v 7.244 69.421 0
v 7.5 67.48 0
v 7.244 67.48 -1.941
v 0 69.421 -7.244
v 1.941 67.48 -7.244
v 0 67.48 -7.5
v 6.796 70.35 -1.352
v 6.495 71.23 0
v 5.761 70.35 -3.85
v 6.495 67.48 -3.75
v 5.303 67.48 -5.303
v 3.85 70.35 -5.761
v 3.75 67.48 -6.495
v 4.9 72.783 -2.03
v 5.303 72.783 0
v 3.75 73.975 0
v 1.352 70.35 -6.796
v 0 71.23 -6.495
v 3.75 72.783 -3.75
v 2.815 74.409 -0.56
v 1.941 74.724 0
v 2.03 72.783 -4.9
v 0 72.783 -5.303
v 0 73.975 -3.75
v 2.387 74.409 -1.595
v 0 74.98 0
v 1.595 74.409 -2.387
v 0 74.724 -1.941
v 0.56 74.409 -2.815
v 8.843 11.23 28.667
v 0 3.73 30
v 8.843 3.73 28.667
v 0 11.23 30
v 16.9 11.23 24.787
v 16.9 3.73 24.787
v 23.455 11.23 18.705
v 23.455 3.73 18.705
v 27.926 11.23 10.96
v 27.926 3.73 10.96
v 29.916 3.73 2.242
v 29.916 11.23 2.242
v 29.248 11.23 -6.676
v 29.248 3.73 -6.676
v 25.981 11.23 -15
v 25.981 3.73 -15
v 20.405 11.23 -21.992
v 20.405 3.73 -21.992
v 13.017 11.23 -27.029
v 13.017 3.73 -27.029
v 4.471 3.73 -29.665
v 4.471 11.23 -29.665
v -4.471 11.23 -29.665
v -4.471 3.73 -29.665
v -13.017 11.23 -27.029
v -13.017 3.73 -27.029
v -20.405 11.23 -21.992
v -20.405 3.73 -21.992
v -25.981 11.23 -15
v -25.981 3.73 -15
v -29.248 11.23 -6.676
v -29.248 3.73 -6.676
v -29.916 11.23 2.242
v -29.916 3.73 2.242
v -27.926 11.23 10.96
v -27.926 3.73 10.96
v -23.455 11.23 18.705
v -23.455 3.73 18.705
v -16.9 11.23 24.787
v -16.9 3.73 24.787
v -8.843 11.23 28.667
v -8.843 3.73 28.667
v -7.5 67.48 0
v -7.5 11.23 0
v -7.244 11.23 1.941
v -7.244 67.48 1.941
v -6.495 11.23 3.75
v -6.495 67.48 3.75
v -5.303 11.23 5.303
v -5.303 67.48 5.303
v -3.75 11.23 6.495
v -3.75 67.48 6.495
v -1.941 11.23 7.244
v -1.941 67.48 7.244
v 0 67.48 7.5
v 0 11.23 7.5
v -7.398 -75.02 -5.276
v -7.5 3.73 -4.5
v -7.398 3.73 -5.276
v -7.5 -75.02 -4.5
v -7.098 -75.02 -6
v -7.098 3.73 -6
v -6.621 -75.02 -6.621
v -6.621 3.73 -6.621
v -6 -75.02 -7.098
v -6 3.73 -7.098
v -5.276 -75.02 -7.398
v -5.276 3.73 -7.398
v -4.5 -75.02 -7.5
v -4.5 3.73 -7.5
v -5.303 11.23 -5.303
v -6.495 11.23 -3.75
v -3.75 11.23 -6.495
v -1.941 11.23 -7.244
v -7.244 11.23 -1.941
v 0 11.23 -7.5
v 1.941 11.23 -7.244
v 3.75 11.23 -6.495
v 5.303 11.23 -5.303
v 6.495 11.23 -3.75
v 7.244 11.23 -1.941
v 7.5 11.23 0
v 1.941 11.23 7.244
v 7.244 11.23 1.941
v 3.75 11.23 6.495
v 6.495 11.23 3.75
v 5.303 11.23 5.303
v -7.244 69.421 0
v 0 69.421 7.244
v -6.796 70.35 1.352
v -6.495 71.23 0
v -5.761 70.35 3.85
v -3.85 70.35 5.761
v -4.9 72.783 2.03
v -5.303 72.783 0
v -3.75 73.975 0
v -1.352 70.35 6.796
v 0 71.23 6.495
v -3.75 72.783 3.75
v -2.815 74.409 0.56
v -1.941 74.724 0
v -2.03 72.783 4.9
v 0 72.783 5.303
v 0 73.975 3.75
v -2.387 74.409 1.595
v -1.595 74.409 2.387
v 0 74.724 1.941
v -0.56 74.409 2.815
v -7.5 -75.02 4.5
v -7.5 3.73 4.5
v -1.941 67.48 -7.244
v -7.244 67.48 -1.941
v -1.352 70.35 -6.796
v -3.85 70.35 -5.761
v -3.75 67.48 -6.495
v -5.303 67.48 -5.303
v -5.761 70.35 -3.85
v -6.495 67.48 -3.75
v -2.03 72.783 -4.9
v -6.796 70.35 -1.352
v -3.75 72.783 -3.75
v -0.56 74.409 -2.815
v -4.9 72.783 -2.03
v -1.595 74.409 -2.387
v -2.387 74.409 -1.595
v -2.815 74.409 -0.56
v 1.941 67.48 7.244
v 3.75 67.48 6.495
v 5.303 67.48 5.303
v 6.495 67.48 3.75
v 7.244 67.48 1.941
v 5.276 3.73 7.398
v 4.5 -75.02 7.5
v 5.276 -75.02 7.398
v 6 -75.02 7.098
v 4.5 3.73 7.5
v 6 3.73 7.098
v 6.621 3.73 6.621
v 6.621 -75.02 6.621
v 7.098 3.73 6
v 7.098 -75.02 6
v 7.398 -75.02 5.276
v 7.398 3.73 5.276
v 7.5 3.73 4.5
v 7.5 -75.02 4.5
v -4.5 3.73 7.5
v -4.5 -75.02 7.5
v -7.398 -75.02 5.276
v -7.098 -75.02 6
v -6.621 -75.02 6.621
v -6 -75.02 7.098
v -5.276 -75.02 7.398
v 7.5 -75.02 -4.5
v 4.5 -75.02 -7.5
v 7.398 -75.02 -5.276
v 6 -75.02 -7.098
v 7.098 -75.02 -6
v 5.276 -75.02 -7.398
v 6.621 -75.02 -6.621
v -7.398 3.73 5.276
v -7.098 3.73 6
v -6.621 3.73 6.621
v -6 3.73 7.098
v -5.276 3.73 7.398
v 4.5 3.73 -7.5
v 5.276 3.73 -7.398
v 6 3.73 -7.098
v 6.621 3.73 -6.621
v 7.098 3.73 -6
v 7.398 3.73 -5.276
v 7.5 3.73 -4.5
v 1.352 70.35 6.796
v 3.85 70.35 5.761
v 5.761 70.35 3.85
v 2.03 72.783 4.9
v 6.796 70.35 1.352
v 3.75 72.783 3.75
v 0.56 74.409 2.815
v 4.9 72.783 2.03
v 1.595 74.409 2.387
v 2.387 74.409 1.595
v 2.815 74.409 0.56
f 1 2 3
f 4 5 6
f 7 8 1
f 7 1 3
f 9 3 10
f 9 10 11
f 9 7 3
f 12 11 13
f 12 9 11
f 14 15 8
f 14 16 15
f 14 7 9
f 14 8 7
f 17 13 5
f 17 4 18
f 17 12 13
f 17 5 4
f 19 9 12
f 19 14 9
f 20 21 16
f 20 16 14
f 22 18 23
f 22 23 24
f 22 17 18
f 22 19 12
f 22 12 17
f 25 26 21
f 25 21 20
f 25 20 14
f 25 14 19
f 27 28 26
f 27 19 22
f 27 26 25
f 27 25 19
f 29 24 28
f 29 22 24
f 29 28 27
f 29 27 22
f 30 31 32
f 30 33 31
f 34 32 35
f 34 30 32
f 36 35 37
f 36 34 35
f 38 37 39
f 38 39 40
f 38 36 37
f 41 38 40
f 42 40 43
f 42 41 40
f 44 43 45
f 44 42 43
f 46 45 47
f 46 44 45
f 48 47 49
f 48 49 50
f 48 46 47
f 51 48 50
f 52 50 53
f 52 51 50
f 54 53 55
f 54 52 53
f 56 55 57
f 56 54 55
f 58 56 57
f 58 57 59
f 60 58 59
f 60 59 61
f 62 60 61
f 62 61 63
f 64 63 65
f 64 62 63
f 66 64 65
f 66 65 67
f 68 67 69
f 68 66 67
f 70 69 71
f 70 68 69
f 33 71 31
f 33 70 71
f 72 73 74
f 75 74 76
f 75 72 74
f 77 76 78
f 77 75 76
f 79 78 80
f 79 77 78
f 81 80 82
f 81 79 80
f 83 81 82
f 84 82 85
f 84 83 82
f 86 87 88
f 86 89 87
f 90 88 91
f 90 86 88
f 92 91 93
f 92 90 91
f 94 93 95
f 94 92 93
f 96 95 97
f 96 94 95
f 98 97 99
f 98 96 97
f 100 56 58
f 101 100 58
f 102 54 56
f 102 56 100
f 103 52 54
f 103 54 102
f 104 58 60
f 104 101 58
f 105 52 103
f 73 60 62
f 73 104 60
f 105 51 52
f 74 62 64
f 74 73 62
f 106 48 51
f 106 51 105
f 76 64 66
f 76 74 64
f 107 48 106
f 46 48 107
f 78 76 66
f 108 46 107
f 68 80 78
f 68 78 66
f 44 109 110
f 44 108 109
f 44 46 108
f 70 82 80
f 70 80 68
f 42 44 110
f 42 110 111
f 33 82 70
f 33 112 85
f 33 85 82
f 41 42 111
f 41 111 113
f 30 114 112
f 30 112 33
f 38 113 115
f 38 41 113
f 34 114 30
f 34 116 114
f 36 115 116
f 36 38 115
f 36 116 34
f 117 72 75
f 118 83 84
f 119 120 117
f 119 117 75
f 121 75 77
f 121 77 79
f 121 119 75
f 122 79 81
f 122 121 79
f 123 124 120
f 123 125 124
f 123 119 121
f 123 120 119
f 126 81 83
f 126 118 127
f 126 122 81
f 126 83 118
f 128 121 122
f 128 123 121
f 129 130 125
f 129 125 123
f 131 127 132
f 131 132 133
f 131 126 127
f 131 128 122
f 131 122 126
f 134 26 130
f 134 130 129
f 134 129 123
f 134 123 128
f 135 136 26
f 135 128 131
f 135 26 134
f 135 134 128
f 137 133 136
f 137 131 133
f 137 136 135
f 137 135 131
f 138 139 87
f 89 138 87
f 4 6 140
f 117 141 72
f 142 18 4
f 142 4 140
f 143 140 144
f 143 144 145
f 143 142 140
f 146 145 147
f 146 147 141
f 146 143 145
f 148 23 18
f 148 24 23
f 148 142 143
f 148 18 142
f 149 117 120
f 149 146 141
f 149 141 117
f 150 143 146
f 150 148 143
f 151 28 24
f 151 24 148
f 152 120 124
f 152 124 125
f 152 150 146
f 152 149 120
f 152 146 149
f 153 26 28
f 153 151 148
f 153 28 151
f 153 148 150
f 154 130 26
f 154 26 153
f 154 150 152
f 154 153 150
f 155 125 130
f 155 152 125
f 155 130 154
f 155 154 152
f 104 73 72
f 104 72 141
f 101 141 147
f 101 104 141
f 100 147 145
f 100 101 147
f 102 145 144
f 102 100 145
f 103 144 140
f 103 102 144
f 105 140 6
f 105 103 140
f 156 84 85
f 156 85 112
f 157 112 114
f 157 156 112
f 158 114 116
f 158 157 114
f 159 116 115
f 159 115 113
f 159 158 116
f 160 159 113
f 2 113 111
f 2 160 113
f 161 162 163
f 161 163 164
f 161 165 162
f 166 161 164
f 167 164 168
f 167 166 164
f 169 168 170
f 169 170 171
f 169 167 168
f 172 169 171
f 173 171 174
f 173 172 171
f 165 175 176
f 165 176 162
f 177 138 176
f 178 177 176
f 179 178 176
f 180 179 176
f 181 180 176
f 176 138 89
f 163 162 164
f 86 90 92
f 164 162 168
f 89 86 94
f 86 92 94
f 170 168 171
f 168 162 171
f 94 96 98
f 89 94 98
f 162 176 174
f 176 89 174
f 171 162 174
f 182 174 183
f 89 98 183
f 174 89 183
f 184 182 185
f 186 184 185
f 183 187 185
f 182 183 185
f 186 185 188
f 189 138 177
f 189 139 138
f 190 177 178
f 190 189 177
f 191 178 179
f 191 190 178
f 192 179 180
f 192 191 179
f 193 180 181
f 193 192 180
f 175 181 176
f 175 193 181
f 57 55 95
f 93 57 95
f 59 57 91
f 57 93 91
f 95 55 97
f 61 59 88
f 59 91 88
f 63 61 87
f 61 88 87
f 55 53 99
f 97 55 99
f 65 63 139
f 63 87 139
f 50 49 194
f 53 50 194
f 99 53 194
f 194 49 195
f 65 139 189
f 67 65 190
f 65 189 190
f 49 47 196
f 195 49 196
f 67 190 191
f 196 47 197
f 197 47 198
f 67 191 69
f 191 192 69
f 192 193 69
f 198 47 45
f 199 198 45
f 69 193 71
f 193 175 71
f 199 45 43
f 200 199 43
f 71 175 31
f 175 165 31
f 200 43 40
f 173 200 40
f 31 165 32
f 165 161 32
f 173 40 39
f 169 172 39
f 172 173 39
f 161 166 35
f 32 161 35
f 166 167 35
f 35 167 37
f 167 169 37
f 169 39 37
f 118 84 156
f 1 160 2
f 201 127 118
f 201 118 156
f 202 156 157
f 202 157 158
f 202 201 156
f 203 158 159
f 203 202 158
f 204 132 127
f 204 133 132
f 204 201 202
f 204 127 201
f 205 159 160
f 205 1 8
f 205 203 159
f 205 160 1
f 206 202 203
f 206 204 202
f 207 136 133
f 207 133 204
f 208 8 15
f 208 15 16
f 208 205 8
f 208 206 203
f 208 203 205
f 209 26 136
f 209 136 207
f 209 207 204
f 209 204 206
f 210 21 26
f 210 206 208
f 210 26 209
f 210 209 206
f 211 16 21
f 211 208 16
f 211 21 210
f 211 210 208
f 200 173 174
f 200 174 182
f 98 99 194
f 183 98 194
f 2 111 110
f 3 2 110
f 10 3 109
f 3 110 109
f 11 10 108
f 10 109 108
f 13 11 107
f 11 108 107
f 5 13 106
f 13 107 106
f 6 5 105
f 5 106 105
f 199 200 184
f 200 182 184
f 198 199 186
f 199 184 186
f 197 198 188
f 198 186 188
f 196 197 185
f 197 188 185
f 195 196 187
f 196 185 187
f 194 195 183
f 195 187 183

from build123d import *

# Parameters (mm, degrees)
SKETCH1_W           = 10
SKETCH1_H           = 10
BOSS_EXTRUDE1_DEPTH = 50
BOSS_EXTRUDE2_START = -45
SKETCH2_R           = 20
BOSS_EXTRUDE2_DEPTH = 2.5
FILLET2_R           = 2
FILLET3_R           = 5
FILLET4_R           = 5
SCALE1_SCALE        = 1.5


with BuildPart() as part:
    # Sketch1 → Boss-Extrude1 (new, symmetric)
    with BuildSketch(Plane(origin=(0, 0, 0), x_dir=(1, 0, 0), z_dir=(0, 1, 0))):
        Rectangle(SKETCH1_W, SKETCH1_H)
    extrude(amount=BOSS_EXTRUDE1_DEPTH, both=True)

    # Sketch2 → Boss-Extrude2 (add, symmetric)
    with BuildSketch(Plane(origin=(0, 50, 0), x_dir=(1, 0, 0), z_dir=(0, 1, 0)).offset(BOSS_EXTRUDE2_START)):
        with Locations(Location((0, 0, 0), (0, 0, 270))):
            Circle(SKETCH2_R)
    extrude(amount=BOSS_EXTRUDE2_DEPTH, both=True)

    # Fillet2
    fillet2_edges = [part.edges().sort_by_distance(p)[0] for p in [
        (5, -23.75, 5),
        (-5, -23.75, 5),
        (-5, -23.75, -5),
        (5, -23.75, -5),
    ]]
    fillet(fillet2_edges, radius=FILLET2_R)

    # Fillet3
    fillet3_edges = [part.edges().sort_by_distance(p)[0] for p in [
        (-5, 28.75, -5),
        (-5, 28.75, 5),
        (5, 28.75, 5),
        (5, 28.75, -5),
    ]]
    fillet(fillet3_edges, radius=FILLET3_R - 0.0001)  # a hair under: the kernel refuses the full size

    # Fillet4
    fillet4_edges = [part.edges().sort_by_distance(p)[0] for p in [
        (3.535563195, 50, -3.535563195),
        (3.535563195, 50, 3.535563195),
        (-3.535563195, 50, 3.535563195),
        (-3.535563195, 50, -3.535563195),
    ]]
    fillet(fillet4_edges, radius=FILLET4_R - 0.0001)  # a hair under: the kernel refuses the full size


with BuildPart() as part_1:
    # Scale1: scaled about (0, 0.040894901, 0)
    add(part.part.scale(SCALE1_SCALE).moved(Location((0, -0.02044745, 0))))


solid = part_1.part
